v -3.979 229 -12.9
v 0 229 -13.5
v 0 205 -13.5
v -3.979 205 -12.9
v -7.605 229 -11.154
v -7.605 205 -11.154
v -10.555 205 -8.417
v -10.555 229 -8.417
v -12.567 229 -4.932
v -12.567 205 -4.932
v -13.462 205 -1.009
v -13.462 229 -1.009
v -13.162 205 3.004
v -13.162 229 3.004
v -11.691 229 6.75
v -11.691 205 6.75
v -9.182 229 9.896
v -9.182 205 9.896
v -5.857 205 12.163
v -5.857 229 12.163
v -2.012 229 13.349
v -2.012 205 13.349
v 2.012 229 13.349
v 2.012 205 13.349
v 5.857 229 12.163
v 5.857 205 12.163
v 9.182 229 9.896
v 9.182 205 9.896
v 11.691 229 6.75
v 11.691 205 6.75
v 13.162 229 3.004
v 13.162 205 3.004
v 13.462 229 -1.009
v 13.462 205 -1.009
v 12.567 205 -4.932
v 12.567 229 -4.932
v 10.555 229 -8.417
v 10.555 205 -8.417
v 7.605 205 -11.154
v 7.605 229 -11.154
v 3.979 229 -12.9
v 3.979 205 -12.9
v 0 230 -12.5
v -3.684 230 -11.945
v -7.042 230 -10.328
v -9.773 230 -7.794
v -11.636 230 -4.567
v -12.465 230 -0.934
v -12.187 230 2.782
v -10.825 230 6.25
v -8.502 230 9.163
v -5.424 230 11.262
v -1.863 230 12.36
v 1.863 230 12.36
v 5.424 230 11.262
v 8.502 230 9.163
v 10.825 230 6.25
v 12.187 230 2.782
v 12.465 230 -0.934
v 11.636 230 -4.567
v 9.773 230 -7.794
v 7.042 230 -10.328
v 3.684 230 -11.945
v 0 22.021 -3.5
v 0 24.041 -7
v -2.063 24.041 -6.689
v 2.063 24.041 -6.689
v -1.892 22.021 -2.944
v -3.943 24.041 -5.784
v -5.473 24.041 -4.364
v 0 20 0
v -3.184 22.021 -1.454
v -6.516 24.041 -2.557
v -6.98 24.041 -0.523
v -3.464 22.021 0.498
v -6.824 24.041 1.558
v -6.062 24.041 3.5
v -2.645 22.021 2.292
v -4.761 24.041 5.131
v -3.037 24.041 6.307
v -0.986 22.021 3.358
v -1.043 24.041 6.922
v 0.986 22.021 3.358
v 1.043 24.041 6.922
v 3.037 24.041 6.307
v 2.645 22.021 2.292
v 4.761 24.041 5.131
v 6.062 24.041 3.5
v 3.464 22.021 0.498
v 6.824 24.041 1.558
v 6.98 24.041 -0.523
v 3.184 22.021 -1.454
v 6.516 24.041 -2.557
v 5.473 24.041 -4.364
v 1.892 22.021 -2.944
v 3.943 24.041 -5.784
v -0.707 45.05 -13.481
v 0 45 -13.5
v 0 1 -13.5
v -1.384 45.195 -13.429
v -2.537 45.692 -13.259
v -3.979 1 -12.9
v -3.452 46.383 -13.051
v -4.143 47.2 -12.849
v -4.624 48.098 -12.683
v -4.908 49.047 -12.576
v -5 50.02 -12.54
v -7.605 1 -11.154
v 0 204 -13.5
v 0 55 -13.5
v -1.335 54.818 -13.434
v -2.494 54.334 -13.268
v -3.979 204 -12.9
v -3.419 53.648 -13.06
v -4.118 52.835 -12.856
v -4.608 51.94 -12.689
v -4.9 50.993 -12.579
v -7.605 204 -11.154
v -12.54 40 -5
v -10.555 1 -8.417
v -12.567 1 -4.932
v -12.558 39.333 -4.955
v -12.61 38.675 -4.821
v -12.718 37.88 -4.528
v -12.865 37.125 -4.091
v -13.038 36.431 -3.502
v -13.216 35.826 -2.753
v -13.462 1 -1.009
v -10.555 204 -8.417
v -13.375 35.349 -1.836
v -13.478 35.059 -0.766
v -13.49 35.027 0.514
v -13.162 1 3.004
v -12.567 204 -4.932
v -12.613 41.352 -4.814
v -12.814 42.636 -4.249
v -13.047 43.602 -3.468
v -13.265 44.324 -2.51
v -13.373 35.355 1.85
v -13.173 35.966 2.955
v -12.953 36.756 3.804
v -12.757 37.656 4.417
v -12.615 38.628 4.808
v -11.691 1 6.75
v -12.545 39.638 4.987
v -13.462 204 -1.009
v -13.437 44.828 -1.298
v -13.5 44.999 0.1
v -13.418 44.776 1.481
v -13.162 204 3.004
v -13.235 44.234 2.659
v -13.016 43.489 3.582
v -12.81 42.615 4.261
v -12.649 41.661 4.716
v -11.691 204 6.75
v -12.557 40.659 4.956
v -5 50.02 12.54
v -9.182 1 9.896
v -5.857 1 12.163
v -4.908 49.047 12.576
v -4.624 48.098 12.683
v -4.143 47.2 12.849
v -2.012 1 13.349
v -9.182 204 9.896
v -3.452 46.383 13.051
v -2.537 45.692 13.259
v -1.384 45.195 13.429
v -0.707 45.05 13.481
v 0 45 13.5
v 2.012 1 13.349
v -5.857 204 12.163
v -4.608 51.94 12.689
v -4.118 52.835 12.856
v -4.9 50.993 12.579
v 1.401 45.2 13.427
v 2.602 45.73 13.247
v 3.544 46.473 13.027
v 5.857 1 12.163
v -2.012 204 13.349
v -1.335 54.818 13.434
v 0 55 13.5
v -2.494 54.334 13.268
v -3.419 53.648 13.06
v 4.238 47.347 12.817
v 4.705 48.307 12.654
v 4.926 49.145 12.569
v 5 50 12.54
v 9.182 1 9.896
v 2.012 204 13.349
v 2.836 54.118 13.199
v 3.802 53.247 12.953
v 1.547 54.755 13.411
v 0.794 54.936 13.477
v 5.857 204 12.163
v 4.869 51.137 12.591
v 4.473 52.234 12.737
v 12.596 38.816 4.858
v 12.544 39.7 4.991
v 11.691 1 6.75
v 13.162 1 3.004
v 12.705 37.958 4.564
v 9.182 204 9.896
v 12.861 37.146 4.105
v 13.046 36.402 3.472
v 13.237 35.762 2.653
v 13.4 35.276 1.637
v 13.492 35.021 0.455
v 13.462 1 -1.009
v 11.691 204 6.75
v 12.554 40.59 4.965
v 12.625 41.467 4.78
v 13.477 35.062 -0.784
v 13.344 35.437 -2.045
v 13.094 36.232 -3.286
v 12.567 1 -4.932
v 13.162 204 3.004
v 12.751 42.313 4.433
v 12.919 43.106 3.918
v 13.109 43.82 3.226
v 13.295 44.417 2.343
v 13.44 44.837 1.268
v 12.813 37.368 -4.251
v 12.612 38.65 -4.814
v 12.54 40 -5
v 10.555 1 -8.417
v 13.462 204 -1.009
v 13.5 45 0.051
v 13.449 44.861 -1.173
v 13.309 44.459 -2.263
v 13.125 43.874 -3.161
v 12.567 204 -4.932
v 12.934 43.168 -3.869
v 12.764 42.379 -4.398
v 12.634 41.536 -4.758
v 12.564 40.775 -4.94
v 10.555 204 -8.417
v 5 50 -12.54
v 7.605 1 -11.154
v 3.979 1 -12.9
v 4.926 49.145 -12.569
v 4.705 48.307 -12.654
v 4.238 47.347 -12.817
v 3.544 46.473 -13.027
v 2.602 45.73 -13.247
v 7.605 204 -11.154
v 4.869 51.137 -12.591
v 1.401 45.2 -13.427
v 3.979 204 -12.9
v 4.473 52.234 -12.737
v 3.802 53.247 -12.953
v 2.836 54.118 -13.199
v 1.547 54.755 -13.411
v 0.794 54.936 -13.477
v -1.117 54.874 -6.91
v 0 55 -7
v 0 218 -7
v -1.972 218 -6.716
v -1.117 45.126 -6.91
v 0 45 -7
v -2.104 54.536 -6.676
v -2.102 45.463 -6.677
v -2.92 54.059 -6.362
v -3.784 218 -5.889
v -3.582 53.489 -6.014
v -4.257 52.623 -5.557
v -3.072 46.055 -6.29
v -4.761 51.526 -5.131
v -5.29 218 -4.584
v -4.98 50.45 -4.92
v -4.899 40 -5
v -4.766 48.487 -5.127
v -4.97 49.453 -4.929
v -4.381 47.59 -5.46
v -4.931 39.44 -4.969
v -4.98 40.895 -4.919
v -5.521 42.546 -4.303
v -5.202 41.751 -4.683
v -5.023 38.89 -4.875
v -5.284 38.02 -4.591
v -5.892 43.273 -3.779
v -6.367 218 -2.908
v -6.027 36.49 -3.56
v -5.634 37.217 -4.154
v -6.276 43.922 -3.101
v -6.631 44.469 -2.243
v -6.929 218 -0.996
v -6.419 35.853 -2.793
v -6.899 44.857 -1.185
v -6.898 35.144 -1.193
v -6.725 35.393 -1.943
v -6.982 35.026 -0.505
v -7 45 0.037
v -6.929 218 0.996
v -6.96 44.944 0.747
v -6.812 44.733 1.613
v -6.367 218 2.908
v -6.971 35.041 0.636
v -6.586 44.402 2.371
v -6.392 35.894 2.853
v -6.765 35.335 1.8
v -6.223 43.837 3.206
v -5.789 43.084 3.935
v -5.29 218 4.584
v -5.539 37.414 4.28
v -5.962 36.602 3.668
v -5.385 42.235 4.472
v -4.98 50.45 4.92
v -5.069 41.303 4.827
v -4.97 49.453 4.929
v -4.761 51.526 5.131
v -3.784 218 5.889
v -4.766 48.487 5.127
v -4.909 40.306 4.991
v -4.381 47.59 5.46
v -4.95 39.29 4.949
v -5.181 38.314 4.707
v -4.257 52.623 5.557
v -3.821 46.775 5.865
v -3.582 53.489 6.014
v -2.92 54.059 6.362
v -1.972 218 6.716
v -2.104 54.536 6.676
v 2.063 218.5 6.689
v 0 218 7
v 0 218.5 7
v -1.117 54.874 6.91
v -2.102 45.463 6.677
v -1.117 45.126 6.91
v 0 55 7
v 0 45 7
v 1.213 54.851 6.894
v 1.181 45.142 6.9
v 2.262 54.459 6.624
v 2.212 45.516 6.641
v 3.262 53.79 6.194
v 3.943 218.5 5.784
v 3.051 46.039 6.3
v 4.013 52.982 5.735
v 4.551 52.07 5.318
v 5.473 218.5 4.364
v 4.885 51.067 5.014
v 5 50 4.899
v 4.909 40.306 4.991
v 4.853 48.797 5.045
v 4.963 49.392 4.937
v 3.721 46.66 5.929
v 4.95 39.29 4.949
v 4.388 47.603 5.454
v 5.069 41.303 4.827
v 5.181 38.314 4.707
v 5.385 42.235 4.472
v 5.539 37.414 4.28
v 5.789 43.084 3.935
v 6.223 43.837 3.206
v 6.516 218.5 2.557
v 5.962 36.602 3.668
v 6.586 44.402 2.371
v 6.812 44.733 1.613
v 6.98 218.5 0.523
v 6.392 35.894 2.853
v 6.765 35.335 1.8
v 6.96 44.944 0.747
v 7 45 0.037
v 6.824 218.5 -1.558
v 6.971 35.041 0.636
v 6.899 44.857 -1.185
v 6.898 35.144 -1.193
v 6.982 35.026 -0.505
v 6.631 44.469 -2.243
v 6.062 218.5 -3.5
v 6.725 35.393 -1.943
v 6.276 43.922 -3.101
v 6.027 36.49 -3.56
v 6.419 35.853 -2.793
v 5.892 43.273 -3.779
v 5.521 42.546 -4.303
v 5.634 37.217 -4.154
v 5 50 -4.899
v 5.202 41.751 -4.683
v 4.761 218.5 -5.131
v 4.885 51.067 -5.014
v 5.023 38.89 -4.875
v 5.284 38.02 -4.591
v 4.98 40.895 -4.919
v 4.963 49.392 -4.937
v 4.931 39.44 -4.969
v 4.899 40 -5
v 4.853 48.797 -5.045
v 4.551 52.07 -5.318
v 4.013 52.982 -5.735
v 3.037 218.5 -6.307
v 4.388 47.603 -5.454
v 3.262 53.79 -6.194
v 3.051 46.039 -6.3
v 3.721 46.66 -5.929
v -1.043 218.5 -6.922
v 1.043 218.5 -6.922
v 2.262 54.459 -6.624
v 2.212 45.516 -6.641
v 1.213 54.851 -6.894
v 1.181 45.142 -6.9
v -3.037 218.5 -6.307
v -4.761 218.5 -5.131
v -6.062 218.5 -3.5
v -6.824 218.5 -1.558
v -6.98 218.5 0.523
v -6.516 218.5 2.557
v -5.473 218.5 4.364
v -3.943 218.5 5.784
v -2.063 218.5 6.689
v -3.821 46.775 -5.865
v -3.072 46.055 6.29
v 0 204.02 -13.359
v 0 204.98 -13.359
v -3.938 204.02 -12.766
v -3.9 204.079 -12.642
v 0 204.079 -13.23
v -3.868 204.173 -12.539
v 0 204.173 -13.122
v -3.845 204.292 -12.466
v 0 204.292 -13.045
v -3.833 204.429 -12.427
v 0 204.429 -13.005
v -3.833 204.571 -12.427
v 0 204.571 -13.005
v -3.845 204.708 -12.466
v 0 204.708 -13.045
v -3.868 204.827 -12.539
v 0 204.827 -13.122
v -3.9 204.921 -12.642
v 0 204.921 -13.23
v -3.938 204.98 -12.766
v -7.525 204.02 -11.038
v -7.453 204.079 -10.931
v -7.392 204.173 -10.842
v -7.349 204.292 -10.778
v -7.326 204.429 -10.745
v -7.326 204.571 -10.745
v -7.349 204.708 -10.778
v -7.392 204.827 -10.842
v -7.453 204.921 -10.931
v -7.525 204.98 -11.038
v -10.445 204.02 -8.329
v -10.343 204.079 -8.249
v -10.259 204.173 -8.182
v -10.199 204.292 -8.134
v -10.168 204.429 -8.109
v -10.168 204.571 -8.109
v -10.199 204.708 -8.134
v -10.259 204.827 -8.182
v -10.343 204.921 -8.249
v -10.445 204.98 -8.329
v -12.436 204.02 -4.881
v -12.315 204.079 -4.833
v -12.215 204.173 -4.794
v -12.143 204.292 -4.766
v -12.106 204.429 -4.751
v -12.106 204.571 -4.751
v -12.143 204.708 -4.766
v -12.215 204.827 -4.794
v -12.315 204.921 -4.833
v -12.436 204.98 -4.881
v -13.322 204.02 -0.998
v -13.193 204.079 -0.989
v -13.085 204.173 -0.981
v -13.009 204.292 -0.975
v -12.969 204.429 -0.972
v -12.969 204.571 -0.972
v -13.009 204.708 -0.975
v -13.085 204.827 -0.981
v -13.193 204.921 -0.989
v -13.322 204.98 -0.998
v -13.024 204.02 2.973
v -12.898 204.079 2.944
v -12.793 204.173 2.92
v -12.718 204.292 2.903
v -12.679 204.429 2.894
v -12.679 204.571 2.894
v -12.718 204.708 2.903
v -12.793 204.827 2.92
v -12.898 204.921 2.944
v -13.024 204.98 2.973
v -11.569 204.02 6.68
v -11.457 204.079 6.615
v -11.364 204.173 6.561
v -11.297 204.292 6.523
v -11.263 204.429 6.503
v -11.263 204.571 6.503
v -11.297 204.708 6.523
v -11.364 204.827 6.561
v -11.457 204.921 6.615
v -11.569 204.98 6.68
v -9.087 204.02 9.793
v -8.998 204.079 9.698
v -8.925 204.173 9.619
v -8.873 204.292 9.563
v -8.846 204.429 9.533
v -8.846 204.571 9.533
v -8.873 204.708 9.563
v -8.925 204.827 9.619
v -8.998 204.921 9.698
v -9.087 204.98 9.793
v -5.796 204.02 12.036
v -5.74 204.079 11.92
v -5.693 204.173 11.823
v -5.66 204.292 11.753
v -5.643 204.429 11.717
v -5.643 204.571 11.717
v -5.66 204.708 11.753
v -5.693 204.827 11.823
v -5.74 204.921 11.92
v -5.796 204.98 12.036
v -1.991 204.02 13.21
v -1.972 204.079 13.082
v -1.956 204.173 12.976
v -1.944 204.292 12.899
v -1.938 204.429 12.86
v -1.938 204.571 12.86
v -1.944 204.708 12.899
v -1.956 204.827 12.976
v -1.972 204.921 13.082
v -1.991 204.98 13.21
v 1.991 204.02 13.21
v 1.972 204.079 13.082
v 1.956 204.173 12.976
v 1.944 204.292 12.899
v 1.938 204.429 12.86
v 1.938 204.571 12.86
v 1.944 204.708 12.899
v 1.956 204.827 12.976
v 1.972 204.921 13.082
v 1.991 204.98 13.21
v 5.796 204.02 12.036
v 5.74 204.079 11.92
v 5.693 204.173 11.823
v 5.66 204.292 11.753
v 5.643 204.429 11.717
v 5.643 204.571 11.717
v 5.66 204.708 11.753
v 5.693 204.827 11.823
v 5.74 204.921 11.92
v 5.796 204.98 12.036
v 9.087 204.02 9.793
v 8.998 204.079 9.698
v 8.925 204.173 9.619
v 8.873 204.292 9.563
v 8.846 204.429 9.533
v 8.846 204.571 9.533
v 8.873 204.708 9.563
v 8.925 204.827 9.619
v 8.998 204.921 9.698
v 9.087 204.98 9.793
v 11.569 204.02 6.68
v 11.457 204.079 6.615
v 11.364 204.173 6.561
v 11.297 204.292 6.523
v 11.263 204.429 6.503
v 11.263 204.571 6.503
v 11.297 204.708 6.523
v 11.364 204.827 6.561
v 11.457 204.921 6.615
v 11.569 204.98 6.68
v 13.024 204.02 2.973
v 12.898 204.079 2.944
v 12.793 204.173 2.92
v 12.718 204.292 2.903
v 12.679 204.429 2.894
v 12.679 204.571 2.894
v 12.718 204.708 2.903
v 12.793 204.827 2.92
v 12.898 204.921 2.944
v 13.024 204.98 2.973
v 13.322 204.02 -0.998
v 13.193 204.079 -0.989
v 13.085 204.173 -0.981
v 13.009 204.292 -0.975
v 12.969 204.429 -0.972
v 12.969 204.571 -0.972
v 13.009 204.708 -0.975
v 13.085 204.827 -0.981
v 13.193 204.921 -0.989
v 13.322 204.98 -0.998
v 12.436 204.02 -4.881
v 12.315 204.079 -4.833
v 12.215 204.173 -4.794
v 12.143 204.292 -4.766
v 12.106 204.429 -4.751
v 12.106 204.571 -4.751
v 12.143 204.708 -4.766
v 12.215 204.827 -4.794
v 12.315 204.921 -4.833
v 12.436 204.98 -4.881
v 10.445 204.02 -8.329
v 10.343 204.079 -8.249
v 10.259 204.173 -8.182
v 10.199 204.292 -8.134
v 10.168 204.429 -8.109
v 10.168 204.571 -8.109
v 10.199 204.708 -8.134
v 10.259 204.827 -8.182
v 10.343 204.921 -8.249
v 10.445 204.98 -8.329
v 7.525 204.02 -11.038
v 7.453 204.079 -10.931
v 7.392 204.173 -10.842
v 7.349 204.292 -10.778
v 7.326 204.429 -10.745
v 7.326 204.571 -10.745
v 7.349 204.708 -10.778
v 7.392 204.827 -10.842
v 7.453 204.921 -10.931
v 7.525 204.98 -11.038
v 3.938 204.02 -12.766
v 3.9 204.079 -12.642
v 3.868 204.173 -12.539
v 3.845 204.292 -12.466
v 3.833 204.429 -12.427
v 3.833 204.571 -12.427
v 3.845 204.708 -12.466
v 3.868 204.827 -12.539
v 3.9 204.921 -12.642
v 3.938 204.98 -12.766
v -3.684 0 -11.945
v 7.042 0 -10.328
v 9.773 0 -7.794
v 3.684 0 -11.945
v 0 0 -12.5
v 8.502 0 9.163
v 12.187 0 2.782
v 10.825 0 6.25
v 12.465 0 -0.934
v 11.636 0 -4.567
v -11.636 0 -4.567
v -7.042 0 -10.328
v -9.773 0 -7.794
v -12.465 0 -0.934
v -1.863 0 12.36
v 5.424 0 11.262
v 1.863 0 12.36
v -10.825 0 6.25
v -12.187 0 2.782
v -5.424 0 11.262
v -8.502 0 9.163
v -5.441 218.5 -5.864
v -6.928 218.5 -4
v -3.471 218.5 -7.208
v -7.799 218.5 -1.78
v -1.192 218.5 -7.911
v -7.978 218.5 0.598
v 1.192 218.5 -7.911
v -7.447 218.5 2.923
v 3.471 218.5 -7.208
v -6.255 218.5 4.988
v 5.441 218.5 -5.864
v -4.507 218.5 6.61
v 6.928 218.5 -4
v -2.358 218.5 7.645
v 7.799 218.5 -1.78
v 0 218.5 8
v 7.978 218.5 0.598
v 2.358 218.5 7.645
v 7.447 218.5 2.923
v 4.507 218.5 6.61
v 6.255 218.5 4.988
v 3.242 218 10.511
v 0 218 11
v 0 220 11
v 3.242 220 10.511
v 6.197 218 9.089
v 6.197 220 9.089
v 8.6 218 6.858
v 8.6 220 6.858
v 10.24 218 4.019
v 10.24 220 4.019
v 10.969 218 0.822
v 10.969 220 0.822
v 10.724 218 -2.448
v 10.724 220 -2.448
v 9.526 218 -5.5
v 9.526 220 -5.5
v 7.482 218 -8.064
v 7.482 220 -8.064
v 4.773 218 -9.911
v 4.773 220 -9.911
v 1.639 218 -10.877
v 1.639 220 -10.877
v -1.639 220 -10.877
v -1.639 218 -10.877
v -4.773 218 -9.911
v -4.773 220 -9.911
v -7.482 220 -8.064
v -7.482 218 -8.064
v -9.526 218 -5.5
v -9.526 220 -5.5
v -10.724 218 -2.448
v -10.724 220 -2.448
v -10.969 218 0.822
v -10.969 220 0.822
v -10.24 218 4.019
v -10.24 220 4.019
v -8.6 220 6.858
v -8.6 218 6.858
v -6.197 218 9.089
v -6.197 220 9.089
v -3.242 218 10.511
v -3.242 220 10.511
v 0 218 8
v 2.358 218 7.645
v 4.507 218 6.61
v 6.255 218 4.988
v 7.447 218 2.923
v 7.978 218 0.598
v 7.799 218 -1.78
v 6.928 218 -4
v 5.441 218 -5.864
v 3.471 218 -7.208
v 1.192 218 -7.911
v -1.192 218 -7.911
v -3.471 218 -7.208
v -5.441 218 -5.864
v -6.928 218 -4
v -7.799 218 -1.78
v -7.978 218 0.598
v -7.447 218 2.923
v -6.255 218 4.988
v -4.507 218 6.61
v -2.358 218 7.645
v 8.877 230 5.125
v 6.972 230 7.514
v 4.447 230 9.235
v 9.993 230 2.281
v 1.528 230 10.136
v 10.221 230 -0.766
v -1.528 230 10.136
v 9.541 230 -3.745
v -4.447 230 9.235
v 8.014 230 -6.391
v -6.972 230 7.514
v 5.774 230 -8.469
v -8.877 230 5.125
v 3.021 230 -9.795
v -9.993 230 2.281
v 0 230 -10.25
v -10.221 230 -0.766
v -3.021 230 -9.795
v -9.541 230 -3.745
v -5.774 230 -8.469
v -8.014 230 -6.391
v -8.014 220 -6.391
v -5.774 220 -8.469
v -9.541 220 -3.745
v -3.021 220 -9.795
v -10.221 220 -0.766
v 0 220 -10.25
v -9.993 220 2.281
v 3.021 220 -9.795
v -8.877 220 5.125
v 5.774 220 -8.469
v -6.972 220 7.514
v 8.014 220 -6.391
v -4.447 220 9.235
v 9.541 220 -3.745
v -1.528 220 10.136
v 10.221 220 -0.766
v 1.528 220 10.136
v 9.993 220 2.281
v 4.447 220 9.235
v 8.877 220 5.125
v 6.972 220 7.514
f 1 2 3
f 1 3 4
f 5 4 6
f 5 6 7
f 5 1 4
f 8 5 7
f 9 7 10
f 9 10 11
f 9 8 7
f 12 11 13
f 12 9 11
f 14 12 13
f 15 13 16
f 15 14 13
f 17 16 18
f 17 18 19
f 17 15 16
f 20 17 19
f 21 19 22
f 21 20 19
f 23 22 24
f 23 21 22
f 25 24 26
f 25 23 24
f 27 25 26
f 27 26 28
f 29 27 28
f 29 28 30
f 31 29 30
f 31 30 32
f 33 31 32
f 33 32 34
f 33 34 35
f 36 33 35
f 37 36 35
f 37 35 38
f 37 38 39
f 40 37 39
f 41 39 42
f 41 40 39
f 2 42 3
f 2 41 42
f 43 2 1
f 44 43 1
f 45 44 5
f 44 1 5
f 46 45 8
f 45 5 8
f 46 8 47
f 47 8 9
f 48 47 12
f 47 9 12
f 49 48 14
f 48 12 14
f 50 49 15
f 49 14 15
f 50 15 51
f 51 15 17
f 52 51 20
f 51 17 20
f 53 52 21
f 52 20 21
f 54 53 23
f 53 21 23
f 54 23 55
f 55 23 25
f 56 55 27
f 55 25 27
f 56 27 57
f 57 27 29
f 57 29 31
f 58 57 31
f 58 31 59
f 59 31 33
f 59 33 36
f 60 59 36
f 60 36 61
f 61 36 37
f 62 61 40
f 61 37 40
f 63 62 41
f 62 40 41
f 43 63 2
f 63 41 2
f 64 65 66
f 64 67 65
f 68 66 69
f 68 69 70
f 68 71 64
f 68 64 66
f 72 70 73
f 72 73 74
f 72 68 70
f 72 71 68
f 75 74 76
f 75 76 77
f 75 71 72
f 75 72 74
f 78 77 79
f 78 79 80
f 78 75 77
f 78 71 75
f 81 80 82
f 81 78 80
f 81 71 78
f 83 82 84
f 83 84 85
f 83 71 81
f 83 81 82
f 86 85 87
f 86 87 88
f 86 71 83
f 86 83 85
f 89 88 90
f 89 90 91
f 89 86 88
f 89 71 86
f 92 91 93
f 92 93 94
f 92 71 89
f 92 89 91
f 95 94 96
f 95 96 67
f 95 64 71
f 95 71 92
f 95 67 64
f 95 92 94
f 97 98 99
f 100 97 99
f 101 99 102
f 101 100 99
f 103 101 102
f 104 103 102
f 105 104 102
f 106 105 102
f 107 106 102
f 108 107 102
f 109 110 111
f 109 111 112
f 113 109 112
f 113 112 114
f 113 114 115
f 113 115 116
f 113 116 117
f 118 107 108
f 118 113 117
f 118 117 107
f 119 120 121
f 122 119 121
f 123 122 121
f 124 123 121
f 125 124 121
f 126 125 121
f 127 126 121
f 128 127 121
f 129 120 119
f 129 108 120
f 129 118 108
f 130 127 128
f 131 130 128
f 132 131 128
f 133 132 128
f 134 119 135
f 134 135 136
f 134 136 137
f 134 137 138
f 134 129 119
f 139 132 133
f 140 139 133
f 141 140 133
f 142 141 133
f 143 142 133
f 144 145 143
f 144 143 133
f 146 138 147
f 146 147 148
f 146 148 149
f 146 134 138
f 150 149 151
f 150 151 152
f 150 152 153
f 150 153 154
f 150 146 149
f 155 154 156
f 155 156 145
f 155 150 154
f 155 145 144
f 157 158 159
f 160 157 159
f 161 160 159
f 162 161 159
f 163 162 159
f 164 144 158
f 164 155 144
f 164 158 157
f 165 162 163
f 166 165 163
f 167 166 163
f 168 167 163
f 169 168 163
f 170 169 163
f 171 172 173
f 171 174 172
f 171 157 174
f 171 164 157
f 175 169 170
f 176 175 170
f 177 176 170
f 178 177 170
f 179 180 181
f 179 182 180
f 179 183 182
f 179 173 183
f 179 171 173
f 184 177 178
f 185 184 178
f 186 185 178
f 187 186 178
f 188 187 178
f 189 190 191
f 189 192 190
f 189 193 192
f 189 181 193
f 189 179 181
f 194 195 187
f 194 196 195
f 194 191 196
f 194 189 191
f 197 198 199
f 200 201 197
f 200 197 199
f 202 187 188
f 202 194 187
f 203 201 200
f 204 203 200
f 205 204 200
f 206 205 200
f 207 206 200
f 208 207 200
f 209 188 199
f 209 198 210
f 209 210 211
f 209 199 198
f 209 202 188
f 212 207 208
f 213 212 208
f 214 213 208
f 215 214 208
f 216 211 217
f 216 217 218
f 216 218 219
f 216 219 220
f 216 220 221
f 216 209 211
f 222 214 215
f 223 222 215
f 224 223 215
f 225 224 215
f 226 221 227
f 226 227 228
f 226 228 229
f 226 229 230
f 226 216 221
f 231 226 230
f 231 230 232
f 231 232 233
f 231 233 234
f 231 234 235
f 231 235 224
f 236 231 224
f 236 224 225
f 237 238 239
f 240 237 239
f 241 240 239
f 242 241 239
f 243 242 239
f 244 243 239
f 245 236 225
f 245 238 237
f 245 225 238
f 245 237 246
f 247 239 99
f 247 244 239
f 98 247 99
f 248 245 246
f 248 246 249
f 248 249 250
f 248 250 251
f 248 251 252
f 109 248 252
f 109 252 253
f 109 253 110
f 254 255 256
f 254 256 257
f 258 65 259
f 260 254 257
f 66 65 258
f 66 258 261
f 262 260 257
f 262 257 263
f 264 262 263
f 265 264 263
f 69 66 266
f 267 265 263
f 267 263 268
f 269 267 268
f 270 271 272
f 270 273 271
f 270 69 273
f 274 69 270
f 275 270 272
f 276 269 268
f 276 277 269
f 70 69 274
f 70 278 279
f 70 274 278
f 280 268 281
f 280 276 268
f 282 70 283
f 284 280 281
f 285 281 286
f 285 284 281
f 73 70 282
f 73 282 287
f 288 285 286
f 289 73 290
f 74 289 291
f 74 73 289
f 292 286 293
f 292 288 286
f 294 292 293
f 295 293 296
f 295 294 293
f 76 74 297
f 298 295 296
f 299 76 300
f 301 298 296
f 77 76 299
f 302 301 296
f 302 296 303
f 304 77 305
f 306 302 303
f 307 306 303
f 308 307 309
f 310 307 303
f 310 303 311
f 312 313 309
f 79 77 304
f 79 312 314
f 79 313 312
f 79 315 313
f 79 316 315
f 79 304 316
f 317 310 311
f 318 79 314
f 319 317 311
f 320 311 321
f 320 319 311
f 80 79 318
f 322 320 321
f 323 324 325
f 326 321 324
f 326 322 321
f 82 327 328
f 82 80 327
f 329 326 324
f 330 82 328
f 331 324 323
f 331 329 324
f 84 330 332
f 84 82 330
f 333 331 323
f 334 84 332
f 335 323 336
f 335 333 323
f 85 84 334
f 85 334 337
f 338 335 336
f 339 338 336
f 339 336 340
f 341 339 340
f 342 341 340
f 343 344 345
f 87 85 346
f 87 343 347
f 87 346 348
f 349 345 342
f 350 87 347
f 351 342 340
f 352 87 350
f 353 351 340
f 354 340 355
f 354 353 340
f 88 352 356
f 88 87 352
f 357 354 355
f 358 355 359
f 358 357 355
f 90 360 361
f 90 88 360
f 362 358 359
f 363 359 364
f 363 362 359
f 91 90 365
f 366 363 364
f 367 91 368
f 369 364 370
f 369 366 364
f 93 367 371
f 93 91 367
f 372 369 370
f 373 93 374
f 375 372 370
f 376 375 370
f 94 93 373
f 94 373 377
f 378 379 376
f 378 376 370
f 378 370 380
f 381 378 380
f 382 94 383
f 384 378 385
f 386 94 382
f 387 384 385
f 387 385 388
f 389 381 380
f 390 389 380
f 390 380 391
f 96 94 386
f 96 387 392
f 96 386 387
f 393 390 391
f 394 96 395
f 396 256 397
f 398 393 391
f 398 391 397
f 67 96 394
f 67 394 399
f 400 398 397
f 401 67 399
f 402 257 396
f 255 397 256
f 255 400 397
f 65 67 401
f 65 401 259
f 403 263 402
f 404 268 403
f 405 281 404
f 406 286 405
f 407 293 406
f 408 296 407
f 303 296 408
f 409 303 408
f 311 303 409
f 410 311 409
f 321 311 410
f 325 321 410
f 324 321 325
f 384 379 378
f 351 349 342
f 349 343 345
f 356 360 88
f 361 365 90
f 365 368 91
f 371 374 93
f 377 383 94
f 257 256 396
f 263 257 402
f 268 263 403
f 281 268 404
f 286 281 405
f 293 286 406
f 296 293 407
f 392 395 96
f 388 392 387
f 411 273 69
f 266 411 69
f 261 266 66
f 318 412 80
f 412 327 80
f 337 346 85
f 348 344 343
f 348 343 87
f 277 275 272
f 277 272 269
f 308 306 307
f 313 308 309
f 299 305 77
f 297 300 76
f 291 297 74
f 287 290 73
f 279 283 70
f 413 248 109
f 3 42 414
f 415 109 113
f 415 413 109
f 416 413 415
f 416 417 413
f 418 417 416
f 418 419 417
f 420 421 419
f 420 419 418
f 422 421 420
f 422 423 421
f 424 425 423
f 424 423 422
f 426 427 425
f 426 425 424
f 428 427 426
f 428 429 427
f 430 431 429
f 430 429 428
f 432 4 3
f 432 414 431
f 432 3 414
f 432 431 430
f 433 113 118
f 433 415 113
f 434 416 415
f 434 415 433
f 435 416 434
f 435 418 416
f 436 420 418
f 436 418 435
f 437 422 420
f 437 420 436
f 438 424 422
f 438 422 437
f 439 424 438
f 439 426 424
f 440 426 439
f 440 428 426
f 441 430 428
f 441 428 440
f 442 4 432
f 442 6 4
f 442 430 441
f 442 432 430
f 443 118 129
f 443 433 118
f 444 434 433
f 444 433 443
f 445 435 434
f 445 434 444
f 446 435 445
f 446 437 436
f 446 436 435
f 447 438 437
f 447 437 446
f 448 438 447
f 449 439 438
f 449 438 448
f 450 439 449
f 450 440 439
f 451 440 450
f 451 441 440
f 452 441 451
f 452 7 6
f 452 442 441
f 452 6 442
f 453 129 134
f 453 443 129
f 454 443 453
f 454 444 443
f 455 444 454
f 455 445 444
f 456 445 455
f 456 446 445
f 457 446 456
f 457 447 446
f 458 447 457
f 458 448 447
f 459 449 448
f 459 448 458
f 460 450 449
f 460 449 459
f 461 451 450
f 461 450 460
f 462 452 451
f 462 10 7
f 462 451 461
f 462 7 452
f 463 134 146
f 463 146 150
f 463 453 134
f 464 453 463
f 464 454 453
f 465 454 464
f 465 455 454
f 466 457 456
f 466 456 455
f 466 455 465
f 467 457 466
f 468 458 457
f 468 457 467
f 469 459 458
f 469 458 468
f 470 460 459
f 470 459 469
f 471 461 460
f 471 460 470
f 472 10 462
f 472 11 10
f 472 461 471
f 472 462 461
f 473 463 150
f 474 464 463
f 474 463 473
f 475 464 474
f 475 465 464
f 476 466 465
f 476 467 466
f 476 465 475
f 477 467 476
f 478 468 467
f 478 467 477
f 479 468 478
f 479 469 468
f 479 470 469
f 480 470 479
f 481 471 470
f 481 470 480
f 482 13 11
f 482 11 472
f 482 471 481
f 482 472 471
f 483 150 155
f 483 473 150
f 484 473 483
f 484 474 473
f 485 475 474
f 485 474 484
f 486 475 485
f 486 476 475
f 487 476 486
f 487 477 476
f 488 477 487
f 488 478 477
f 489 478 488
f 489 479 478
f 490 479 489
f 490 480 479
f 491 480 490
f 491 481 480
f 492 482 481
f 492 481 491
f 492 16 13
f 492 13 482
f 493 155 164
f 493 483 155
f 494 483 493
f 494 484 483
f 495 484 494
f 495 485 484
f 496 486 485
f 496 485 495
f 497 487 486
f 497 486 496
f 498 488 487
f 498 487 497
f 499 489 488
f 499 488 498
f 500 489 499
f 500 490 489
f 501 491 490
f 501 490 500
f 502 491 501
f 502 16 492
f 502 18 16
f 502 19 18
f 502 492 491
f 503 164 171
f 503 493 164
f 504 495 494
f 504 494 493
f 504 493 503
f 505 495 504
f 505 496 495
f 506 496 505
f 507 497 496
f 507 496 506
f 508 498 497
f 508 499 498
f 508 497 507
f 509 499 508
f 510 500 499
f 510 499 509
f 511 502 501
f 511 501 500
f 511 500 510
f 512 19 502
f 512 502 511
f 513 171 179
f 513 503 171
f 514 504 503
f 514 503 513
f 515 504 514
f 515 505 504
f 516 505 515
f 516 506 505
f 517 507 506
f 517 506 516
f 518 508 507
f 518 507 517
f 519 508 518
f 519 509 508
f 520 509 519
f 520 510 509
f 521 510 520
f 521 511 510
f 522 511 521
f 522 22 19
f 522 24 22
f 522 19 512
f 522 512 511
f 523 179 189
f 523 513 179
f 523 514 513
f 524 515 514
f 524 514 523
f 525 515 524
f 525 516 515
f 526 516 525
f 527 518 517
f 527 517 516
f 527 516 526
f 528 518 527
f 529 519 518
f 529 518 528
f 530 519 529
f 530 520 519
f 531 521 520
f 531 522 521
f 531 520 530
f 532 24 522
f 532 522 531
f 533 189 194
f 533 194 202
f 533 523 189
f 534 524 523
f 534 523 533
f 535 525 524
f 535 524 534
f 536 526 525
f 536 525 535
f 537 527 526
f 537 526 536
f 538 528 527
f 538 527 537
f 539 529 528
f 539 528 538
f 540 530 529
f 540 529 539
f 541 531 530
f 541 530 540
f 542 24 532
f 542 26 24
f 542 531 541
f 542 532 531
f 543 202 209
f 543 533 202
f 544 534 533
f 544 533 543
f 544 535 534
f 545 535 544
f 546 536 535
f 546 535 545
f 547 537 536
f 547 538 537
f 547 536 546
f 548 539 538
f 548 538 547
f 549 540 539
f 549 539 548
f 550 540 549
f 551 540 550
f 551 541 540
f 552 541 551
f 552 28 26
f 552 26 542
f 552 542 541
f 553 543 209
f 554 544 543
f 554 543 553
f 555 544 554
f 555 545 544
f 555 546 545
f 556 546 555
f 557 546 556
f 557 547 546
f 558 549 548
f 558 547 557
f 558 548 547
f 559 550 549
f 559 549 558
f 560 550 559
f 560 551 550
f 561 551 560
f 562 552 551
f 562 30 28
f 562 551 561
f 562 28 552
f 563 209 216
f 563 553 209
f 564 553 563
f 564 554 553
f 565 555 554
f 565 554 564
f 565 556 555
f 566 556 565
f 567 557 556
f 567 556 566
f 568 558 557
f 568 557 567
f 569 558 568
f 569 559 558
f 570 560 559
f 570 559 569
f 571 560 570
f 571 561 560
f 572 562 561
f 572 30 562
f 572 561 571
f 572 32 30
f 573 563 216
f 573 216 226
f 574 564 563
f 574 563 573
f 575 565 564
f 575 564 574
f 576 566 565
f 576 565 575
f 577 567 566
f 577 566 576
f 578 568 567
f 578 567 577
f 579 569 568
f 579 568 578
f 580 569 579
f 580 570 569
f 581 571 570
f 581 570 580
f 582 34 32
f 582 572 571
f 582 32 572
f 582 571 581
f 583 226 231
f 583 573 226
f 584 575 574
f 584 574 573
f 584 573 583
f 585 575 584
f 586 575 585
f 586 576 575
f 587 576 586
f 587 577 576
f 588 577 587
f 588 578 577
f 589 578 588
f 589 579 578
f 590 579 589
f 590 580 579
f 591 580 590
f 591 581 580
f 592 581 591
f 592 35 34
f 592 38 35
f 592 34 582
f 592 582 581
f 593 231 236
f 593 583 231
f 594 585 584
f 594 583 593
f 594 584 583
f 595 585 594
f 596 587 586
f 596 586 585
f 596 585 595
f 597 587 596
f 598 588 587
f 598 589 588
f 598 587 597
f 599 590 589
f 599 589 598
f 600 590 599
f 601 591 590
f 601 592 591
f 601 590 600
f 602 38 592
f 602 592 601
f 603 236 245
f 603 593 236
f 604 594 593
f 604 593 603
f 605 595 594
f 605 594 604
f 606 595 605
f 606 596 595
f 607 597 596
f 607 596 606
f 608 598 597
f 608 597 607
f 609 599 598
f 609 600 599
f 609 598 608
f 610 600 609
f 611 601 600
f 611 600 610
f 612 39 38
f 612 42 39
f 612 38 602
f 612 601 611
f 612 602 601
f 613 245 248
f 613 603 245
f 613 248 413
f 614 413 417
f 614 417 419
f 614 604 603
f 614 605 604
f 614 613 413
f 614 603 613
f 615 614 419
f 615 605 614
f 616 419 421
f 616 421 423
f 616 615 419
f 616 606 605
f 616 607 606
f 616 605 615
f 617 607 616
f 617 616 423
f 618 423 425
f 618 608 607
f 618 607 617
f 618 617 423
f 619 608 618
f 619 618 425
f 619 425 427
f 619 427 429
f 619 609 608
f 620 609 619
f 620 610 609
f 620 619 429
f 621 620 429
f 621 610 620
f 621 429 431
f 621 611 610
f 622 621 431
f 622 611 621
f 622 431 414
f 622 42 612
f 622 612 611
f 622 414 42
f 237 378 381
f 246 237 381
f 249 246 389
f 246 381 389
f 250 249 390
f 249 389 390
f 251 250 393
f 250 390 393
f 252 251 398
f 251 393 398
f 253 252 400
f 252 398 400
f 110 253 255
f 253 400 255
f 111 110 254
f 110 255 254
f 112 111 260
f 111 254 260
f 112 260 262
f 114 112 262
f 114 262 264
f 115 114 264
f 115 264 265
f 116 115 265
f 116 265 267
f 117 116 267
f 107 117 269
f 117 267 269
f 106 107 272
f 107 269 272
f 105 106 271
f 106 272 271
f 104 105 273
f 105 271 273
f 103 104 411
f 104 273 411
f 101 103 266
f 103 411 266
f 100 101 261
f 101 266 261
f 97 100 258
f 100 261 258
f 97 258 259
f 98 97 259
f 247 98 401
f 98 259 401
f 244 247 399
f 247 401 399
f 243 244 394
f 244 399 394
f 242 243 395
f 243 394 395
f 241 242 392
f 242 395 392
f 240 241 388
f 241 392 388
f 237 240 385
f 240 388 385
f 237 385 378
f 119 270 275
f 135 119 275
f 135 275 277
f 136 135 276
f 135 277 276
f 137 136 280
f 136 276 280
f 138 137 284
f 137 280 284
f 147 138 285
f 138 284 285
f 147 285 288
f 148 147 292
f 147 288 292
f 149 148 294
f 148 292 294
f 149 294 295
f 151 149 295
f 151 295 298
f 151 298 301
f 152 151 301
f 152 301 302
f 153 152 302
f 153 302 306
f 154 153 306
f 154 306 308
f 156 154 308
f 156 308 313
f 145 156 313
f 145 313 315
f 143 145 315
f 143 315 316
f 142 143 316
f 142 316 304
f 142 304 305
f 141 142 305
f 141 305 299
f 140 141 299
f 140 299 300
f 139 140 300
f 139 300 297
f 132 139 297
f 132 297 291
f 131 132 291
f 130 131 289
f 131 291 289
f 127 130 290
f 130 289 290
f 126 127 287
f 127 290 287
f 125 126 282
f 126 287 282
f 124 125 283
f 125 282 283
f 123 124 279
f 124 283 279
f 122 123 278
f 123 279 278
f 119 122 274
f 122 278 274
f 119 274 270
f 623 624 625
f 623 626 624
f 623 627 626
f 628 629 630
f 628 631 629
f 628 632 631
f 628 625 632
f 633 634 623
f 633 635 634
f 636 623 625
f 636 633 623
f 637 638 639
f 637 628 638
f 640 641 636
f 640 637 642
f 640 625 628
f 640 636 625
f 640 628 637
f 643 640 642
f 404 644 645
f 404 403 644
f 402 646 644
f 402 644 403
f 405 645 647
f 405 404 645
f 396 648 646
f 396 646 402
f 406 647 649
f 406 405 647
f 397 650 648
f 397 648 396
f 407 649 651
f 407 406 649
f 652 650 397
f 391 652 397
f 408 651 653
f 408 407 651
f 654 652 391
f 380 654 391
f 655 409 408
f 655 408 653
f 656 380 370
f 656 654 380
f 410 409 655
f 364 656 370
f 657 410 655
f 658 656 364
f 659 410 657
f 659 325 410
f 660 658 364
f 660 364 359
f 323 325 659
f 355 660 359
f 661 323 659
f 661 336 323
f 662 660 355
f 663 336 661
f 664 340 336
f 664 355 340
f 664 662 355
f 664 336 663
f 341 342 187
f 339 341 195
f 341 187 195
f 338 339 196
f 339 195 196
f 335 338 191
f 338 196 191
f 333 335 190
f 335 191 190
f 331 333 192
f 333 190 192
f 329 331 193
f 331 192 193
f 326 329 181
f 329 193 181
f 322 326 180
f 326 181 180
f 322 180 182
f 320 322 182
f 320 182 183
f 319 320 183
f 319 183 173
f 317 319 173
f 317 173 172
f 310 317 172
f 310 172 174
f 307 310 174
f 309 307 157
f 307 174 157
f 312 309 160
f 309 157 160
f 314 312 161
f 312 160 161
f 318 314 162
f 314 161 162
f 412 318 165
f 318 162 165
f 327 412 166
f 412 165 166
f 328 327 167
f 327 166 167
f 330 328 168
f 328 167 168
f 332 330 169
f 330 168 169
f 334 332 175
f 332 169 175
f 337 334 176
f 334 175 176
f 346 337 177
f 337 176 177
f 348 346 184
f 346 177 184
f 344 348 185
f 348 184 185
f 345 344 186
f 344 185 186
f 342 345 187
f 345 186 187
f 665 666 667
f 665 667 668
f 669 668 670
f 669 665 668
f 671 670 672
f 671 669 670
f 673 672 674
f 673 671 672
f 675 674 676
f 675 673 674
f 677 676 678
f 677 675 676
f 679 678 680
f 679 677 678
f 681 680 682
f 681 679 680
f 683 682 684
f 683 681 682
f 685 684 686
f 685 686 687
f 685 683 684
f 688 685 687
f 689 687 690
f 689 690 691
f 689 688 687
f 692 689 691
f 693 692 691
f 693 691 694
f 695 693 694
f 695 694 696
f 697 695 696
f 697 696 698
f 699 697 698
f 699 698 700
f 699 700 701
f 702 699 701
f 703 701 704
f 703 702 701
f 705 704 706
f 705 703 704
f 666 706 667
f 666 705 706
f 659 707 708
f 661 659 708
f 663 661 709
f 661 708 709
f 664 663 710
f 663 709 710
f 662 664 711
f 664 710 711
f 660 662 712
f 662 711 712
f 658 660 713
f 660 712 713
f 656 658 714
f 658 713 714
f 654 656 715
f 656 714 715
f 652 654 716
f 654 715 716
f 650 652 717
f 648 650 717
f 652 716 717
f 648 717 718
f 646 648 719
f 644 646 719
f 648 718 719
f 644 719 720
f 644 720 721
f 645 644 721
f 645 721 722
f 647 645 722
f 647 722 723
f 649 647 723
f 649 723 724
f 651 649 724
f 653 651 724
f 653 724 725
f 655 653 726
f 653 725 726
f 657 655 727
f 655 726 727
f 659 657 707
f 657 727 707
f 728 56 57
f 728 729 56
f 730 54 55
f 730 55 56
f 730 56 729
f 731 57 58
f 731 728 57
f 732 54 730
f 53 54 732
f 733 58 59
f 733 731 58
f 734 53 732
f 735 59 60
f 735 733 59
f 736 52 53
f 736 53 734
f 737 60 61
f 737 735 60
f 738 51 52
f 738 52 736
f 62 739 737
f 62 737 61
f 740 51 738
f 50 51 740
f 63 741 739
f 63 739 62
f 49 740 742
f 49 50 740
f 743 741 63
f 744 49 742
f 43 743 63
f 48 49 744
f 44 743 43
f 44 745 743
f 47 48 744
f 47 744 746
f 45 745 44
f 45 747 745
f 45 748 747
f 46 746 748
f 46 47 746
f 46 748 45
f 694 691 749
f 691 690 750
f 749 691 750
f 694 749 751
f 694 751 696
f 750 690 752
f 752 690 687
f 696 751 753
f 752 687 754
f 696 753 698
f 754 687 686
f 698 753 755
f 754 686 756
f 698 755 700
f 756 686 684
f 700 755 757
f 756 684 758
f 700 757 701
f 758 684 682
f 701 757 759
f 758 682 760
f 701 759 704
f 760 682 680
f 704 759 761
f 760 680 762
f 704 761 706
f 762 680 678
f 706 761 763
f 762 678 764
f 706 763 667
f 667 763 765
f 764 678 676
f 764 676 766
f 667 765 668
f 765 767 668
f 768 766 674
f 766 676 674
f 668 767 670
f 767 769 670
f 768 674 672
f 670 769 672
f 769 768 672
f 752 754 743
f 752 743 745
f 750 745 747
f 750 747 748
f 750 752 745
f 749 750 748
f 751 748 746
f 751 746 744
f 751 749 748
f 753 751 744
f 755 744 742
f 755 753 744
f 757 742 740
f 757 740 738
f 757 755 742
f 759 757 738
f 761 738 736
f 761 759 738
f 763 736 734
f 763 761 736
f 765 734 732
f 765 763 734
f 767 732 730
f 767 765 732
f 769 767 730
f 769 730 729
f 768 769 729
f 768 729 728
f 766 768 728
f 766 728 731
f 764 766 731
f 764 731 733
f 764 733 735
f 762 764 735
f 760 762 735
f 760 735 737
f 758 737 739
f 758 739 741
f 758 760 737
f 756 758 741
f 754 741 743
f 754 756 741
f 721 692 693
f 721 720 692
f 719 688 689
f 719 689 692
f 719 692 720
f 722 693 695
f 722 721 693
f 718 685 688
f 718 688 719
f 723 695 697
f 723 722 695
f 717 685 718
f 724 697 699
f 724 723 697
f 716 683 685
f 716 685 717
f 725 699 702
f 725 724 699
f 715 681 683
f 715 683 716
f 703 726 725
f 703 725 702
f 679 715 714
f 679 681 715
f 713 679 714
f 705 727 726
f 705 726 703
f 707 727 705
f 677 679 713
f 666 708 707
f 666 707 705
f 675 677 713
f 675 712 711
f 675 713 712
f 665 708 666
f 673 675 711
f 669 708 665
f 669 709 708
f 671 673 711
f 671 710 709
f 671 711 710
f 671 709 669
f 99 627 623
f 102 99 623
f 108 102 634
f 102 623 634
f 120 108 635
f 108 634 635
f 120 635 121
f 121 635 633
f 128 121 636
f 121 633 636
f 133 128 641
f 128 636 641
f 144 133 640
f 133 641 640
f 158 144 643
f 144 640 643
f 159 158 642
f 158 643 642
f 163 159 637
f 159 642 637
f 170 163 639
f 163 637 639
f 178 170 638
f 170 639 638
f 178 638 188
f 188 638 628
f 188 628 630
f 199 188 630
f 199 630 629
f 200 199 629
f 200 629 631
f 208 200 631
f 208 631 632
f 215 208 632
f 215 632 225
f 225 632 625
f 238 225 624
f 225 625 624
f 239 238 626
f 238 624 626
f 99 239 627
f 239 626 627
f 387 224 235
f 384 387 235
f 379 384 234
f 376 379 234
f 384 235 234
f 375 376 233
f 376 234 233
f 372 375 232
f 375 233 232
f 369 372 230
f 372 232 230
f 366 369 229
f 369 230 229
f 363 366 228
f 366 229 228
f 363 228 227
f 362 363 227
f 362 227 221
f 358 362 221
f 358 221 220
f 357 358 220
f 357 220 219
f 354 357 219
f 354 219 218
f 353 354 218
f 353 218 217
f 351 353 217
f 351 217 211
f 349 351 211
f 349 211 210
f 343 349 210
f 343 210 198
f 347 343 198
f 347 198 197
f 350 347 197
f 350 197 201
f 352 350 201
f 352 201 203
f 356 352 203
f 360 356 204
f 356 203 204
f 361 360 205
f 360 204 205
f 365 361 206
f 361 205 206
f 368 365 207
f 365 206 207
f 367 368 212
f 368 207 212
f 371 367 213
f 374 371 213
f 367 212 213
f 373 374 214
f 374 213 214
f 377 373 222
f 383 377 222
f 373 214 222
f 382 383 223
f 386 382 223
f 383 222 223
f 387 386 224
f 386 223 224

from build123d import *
from build123d.topology import SkipClean

# Parameters (mm, degrees)
SKETCH_5_R          = 8
SKETCH_5_R_2        = 7
EXTRUDE_1_DEPTH     = 0.5
CHAMFER_2_SIZE      = 1
SKETCH_6_R          = 11
SKETCH_6_R_2        = 10.25
CUT_EXTRUDE_2_DEPTH = 2
CHAMFER_3_SIZE      = 1
SKETCH_9_R          = 5
CUT_EXTRUDE_3_DEPTH = 232.972519924
SKETCH_10_R         = 5
CUT_EXTRUDE_4_DEPTH = 232.972519942


with BuildPart() as part:
    # Эскиз1 → Повернуть1 (revolve)
    with BuildSketch(Plane.XY, mode=Mode.PRIVATE) as revolve_1_sk:
        with BuildLine():
            Line((13.5, 0), (13.5, 204))
            ThreePointArc((13.5, 204), (13, 204.5), (13.5, 205))
            Line((13.5, 205), (13.5, 230))
            Line((13.5, 230), (10.25, 230))
            Line((10.25, 230), (10.25, 218))
            Line((10.25, 218), (7, 218))
            Line((7, 218), (7, 24.041451884))
            Line((7, 24.041451884), (0, 20))
            Line((0, 20), (0, 0))
            Line((0, 0), (13.5, 0))
        make_face()
    revolve(revolve_1_sk.sketch.rotate(Axis((0, 0, 0), (0, 1, 0)), 90), axis=Axis((0, 0, 0), (0, 1, 0)))

    # Эскиз5 → Вытянуть1 (add)
    with BuildSketch(Plane(origin=(0, 218, 0), x_dir=(1, 0, 0), z_dir=(0, 1, 0))):
        with Locations(Location((0, 0, 0), (0, 0, 270))):
            Circle(SKETCH_5_R)
        with Locations(Location((0, 0, 0), (0, 0, 270))):
            Circle(SKETCH_5_R_2, mode=Mode.SUBTRACT)
    extrude(amount=EXTRUDE_1_DEPTH)

    # Фаска2
    chamfer_2_edges = [part.edges().sort_by_distance(p)[0] for p in [
        (0, 230, 13.5),
    ]]
    chamfer(chamfer_2_edges, length=CHAMFER_2_SIZE)

    # Эскиз6 → Вытянуть2 (cut)
    with BuildSketch(Plane(origin=(0, 218, 0), x_dir=(1, 0, 0), z_dir=(0, 1, 0))):
        with Locations(Location((0, 0, 0), (0, 0, 270))):
            Circle(SKETCH_6_R)
        with Locations(Location((0, 0, 0), (0, 0, 90))):
            Circle(SKETCH_6_R_2, mode=Mode.SUBTRACT)
    extrude(amount=CUT_EXTRUDE_2_DEPTH, mode=Mode.SUBTRACT)

    # Фаска3
    chamfer_3_edges = [part.edges().sort_by_distance(p)[0] for p in [
        (0, 0, 13.5),
    ]]
    chamfer(chamfer_3_edges, length=CHAMFER_3_SIZE)

    # Эскиз9 → Вытянуть3 (cut, through all)
    with BuildSketch(Plane(origin=(13.5, 0, 0), x_dir=(0, 0, -1), z_dir=(1, 0, 0))):
        with Locations((0, 40)):
            Circle(SKETCH_9_R)
    extrude(amount=-CUT_EXTRUDE_3_DEPTH, mode=Mode.SUBTRACT)

    # Эскиз10 → Вытянуть4 (cut, through all)
    with SkipClean():  # the faces are left unmerged after this step: merging them gives an invalid solid
        with BuildSketch(Plane.XY.offset(13.5)):
            with Locations((0, 50)):
                Circle(SKETCH_10_R)
        extrude(amount=-CUT_EXTRUDE_4_DEPTH, mode=Mode.SUBTRACT)


solid = part.part
